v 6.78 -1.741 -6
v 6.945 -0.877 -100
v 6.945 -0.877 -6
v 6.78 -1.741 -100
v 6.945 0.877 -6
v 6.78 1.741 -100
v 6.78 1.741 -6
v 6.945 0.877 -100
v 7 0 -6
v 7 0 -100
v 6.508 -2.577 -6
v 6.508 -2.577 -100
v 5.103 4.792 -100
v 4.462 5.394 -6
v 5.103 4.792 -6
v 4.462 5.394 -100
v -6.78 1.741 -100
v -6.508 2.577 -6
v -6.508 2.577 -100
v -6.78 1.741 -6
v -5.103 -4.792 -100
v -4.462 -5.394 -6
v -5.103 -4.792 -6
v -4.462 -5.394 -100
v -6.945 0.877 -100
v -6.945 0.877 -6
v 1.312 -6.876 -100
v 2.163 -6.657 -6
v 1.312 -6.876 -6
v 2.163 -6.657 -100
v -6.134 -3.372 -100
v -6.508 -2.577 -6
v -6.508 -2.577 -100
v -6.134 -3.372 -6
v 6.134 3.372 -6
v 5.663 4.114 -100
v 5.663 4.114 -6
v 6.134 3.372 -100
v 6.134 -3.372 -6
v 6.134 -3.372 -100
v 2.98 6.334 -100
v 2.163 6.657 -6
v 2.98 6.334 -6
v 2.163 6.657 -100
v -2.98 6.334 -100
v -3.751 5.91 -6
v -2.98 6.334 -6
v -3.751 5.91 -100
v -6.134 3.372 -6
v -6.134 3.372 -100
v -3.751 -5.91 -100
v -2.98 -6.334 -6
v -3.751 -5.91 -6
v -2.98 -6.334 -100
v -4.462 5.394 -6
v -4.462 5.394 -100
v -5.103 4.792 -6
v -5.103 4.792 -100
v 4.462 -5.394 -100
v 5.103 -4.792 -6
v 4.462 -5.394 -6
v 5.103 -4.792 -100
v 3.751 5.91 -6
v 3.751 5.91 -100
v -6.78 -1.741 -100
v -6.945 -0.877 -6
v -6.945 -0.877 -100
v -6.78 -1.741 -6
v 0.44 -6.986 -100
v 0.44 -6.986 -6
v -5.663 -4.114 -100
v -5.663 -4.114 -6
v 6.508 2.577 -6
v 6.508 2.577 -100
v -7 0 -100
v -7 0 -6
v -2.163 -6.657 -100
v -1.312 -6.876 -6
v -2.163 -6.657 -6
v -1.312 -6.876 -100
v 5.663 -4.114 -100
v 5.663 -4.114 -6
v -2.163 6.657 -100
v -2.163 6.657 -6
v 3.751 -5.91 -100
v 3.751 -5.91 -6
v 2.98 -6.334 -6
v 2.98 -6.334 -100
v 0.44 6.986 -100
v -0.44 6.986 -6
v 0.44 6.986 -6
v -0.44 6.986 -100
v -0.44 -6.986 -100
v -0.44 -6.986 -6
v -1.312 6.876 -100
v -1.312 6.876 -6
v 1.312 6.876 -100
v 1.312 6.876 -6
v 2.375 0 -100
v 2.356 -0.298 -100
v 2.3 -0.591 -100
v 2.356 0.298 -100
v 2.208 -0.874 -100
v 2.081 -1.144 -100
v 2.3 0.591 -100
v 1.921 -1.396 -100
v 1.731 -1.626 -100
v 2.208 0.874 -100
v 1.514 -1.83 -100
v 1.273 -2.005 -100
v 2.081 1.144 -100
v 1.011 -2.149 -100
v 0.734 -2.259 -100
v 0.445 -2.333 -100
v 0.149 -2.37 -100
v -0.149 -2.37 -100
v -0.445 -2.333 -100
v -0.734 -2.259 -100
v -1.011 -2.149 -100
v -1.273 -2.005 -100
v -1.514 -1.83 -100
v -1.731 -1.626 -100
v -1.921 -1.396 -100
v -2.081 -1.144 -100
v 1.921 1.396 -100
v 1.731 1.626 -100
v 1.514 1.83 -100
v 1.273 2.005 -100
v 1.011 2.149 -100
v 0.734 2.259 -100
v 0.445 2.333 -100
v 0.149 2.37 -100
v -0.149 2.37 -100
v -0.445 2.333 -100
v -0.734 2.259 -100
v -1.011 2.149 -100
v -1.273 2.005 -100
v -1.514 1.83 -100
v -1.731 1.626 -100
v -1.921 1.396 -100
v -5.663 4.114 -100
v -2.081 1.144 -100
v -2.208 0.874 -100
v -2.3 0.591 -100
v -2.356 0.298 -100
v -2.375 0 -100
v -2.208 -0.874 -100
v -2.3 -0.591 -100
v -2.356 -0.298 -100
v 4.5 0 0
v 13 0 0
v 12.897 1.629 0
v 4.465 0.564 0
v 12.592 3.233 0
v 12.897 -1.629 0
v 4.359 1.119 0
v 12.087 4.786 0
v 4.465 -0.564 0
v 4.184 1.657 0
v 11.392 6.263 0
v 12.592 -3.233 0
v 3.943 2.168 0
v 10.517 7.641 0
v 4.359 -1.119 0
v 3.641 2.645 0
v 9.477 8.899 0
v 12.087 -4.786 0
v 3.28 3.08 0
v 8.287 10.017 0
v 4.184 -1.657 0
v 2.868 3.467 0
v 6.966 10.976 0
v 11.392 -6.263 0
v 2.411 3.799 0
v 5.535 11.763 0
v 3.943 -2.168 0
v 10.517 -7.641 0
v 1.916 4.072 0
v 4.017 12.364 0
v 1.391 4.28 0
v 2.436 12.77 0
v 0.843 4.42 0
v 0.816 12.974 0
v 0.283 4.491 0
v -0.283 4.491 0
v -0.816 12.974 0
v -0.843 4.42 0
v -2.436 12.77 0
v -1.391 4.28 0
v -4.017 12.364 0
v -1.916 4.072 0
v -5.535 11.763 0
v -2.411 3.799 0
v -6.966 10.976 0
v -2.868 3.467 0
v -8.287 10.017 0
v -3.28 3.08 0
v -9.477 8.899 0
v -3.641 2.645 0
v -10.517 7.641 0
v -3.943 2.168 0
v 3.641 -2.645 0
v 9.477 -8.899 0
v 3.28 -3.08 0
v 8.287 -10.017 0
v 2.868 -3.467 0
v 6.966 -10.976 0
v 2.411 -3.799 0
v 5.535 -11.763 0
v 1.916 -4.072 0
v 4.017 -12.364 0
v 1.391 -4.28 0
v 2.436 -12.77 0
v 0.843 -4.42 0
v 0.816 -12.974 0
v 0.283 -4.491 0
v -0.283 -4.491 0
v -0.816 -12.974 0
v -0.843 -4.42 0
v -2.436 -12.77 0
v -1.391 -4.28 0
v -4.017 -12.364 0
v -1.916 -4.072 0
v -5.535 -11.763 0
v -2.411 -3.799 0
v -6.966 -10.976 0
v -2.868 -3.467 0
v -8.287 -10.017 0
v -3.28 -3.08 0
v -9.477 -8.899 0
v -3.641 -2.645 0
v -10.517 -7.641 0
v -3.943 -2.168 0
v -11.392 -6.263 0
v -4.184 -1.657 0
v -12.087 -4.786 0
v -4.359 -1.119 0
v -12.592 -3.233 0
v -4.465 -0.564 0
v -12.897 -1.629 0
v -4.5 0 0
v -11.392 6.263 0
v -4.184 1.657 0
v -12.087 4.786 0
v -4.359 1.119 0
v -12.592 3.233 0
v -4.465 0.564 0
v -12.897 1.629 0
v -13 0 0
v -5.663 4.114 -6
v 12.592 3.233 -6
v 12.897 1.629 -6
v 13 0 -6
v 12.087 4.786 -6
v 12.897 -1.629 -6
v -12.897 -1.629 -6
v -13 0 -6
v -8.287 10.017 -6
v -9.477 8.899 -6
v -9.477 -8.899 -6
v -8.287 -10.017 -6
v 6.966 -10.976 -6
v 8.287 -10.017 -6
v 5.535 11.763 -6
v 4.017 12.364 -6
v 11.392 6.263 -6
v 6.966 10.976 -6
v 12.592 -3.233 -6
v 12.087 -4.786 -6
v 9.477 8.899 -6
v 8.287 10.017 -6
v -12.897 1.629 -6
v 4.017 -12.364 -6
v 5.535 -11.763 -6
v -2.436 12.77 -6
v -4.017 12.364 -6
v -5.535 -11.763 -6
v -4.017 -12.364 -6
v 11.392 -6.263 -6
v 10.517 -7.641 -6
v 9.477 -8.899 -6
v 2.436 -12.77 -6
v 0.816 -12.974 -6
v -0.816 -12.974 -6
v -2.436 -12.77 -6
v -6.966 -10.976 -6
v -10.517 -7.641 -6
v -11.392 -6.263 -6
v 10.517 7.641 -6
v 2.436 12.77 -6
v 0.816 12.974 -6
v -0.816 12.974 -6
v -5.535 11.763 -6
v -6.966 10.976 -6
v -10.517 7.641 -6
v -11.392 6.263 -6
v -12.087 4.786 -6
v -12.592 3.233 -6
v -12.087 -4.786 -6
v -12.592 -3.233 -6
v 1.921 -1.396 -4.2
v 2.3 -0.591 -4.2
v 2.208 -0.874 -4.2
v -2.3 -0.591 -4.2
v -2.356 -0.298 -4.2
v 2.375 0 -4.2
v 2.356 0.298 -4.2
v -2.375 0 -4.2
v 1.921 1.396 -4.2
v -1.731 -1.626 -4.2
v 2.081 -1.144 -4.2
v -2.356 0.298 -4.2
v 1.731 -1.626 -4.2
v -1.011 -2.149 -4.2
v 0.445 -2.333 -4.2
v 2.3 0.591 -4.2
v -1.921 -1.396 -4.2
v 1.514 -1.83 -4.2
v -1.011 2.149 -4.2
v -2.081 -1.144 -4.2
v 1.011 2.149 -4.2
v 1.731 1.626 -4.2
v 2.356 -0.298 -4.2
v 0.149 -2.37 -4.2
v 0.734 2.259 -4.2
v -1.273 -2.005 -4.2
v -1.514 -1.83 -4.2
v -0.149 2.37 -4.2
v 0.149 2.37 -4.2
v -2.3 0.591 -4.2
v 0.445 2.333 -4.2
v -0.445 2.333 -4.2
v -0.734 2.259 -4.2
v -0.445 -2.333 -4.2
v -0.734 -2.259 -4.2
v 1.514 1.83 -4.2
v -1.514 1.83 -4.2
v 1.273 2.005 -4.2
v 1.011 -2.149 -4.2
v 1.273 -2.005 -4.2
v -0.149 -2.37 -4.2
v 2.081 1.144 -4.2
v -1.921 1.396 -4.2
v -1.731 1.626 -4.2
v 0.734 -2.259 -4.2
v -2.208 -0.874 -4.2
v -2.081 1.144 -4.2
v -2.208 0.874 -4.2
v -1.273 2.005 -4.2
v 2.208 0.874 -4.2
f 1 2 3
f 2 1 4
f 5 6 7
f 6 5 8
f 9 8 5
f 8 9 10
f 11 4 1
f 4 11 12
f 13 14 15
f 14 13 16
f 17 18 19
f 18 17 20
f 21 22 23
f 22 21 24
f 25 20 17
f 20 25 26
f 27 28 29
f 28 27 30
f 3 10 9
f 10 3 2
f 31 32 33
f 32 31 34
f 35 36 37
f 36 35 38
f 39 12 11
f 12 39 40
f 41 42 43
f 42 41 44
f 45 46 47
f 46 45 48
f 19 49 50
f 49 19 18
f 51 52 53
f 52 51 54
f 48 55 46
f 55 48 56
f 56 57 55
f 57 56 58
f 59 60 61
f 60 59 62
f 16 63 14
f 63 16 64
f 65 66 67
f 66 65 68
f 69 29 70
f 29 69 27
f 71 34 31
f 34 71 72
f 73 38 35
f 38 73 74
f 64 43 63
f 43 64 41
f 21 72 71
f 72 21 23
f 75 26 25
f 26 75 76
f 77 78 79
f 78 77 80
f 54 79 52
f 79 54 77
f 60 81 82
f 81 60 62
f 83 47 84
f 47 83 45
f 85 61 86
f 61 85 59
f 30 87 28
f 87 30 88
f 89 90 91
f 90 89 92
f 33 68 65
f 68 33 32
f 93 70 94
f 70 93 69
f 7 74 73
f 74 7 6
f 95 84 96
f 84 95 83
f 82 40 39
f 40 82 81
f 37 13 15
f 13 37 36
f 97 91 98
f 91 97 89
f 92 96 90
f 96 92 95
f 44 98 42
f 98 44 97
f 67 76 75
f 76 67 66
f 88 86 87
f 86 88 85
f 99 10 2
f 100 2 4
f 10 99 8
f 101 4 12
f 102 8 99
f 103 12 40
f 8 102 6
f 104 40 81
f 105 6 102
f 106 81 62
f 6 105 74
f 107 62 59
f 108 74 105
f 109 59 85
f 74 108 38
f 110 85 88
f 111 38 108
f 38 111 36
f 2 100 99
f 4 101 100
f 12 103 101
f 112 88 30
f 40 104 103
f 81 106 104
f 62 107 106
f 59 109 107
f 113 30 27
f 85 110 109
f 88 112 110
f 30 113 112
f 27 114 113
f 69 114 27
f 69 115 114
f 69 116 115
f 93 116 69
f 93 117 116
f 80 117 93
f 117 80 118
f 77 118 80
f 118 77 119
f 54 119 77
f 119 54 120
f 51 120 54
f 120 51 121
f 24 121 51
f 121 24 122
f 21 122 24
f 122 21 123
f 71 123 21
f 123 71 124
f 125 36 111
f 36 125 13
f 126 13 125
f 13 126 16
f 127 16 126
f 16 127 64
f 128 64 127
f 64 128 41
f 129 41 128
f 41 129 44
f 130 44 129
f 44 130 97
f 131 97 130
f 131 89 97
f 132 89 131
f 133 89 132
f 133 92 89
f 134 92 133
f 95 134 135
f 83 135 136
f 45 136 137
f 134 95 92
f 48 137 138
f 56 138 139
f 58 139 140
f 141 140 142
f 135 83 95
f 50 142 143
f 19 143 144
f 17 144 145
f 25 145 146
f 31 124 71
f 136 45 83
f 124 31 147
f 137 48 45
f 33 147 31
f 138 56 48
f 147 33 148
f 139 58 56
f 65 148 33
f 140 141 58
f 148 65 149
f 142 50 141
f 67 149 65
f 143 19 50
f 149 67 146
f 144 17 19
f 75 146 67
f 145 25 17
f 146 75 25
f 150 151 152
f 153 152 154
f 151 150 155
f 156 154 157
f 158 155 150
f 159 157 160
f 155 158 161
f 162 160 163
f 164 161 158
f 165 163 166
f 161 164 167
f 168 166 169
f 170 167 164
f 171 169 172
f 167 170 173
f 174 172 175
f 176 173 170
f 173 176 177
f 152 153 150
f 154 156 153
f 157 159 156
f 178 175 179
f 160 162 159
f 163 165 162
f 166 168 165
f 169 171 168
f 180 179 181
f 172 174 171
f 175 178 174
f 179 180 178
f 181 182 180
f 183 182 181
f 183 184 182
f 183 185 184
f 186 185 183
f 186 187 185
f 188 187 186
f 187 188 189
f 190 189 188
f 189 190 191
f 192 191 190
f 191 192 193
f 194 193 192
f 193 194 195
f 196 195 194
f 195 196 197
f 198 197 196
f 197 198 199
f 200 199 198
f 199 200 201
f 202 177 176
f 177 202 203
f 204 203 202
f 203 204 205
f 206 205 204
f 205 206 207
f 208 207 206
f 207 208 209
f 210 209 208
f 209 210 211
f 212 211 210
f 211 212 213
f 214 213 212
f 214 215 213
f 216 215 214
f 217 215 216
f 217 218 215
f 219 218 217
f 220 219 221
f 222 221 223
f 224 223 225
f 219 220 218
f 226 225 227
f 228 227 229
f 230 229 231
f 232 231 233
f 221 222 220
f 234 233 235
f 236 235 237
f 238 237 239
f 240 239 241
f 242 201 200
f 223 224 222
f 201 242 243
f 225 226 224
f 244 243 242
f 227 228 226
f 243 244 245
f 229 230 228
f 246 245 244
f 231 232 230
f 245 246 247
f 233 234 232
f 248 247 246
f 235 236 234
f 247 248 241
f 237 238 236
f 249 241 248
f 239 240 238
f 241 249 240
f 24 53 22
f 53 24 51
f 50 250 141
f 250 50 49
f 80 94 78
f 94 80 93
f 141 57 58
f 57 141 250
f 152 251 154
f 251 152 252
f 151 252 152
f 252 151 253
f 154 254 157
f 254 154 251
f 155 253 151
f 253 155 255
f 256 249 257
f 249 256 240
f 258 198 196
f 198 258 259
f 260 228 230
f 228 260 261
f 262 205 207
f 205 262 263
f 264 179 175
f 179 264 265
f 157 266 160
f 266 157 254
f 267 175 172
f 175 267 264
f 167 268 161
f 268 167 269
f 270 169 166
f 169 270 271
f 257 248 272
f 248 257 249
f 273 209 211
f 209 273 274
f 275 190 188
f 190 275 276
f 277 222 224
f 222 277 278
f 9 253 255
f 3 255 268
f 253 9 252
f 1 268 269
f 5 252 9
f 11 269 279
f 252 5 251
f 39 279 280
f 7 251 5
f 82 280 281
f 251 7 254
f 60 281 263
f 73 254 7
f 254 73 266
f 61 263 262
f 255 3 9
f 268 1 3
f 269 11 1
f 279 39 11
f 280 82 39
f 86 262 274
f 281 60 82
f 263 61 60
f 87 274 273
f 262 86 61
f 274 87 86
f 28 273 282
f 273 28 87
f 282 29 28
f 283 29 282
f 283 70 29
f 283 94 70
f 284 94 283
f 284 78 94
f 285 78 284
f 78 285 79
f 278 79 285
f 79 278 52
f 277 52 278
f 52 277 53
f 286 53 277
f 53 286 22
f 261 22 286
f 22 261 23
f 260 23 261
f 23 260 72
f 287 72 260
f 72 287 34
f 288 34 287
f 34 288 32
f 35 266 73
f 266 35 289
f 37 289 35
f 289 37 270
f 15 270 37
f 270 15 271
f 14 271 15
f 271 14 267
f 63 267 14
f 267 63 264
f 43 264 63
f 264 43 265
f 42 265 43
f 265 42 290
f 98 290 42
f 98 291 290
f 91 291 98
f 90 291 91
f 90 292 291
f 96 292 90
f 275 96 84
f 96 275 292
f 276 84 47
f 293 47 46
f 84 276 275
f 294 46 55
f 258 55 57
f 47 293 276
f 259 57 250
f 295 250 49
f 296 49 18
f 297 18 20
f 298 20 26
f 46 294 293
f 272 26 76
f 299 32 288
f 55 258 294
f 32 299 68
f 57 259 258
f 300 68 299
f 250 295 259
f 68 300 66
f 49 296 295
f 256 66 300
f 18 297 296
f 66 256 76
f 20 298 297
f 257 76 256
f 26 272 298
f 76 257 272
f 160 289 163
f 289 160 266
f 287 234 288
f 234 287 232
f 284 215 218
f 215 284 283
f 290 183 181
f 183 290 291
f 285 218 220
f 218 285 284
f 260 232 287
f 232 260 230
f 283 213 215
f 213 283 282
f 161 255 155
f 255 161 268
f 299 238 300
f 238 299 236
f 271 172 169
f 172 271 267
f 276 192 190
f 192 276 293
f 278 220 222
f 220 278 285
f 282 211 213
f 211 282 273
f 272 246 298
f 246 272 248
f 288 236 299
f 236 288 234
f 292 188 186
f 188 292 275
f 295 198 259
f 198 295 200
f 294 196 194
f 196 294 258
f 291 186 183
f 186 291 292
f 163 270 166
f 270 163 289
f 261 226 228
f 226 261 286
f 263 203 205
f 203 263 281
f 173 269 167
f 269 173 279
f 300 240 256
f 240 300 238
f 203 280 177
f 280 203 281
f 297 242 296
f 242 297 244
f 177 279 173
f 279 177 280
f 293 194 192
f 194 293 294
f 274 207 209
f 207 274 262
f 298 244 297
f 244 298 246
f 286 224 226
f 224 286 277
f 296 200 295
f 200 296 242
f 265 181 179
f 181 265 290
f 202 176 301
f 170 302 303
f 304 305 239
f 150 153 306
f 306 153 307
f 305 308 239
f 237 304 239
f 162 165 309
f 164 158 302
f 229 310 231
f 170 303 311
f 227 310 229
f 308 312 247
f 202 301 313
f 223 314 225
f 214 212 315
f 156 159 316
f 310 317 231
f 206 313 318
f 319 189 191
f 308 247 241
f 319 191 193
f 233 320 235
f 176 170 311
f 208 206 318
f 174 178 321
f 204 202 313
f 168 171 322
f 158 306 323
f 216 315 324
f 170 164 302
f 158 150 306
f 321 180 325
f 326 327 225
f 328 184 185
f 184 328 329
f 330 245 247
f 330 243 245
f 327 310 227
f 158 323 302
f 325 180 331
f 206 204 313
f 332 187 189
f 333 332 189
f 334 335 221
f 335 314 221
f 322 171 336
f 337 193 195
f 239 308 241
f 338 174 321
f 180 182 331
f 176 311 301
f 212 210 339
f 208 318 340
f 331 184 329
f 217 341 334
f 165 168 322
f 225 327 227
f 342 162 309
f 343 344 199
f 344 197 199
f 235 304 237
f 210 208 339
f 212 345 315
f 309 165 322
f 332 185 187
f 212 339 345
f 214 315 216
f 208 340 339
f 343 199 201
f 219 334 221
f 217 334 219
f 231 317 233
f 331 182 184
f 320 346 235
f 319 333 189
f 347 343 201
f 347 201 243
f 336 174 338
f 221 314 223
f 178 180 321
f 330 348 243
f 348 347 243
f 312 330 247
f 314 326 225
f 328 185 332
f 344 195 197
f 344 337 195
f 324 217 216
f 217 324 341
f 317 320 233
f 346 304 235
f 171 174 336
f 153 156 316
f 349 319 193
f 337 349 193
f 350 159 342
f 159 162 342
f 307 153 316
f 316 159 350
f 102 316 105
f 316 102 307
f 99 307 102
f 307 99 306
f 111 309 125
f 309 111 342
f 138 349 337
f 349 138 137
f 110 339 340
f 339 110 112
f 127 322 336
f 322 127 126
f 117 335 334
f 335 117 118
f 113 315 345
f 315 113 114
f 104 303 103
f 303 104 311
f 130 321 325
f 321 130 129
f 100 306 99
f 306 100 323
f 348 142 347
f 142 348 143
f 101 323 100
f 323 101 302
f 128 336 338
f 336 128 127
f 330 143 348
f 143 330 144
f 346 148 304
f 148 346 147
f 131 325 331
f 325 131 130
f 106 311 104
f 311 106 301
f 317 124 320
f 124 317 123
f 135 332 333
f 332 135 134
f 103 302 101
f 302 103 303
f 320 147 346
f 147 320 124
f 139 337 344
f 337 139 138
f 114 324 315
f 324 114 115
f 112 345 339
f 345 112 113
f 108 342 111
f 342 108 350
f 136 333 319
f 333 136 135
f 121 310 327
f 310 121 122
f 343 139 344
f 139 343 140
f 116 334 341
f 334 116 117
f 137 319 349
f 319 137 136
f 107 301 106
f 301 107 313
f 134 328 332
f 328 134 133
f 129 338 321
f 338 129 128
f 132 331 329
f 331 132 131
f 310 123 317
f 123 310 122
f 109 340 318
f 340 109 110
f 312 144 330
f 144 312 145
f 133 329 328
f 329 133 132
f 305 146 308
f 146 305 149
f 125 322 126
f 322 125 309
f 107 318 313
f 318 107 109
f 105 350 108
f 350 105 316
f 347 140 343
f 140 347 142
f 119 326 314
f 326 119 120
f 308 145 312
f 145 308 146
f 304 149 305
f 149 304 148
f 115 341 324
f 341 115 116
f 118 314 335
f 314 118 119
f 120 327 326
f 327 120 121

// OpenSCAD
$fn = 50;


difference() {
	union() {
		translate(v = [0, 0, -100.0000000000]) {
			cylinder(h = 100, r = 7.0000000000);
		}
		translate(v = [0, 0, -6.0000000000]) {
			cylinder(h = 6, r = 13.0000000000);
		}
	}
	union() {
		translate(v = [0, 0, 0]) {
			rotate(a = [0, 0, 0]) {
				difference() {
					union() {
						#translate(v = [0, 0, -100.0000000000]) {
							cylinder(h = 100, r = 2.2500000000);
						}
						#translate(v = [0, 0, -4.2000000000]) {
							cylinder(h = 4.2000000000, r = 7.0000000000, r1 = 2.3750000000, r2 = 4.5000000000);
						}
						#translate(v = [0, 0, -100.0000000000]) {
							cylinder(h = 100, r = 2.3750000000);
						}
						#translate(v = [0, 0, -100.0000000000]) {
							cylinder(h = 100, r = 2.2500000000);
						}
					}
					union();
				}
			}
		}
	}
}
